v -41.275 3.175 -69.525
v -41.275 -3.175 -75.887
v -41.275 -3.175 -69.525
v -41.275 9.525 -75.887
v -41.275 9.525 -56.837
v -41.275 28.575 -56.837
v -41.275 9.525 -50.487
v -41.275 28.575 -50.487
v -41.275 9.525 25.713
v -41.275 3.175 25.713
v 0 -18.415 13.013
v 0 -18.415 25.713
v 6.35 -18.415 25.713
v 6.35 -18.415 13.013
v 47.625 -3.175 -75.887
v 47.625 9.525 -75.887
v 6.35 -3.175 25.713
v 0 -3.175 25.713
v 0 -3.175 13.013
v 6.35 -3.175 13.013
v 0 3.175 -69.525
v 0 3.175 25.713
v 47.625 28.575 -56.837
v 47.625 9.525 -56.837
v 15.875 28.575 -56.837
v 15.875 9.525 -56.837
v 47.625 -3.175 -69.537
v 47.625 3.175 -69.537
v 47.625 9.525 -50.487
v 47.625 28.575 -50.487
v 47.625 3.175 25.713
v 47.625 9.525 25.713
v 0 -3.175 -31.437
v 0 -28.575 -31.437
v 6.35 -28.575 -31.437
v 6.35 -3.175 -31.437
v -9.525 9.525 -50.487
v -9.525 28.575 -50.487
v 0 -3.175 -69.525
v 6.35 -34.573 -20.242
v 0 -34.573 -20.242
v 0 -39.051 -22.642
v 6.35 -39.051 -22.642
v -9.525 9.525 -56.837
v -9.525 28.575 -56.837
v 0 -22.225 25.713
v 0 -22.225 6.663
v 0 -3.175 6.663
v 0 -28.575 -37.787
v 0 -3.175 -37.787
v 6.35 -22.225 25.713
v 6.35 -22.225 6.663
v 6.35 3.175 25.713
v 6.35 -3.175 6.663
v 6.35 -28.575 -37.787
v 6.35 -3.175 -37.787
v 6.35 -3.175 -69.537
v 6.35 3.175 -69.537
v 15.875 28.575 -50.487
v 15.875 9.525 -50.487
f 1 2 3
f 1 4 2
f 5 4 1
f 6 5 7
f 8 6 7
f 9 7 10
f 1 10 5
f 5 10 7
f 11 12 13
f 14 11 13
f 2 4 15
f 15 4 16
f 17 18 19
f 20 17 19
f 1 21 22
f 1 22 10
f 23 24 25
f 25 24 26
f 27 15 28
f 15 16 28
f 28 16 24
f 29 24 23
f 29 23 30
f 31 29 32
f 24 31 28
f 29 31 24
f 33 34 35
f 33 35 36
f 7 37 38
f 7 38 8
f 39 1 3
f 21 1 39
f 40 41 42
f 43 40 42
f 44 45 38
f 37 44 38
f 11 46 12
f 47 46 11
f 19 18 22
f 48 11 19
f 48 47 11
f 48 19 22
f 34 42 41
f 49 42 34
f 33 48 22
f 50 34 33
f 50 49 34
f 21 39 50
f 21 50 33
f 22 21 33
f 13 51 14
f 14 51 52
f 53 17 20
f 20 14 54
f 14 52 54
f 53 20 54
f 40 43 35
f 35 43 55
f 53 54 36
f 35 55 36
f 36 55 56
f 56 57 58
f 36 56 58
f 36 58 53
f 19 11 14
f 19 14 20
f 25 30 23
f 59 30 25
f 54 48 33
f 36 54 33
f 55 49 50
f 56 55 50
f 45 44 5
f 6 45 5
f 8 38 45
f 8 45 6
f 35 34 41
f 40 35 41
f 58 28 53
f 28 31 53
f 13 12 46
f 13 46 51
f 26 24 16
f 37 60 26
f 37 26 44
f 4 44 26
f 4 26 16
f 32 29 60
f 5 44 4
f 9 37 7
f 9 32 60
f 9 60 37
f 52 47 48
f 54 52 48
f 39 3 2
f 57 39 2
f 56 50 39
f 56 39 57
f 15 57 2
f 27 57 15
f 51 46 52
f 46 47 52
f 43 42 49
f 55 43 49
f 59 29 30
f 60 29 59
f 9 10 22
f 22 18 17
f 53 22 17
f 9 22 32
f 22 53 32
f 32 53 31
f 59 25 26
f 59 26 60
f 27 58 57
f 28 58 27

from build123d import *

# Parameters (mm, degrees)
F0_W      = 25.4
F0_H      = 6.35
F0_W_2    = 19.05
F1_DEPTH  = 6.35
F3_DEPTH  = 6.35
F4_W      = 31.75
F4_H      = 6.35
F5_DEPTH  = 19.05
F6_W      = 41.275
F6_H      = 6.35
F7_DEPTH  = 6.35
F8_W      = 41.275
F8_H      = 6.361497178
F9_DEPTH  = 6.35
F10_W     = 6.35
F10_H     = 3.81
F11_DEPTH = 12.7


with BuildPart() as f1:
    # F0 (on Right) → F1 (new body)
    with BuildSketch(Plane.YZ):
        Polygon((-28.575, -37.7865453147), (-28.575, -31.4365453147), (-34.5734524408, -20.2424143384), (-39.0511048314, -22.6417953147), align=None)
        with Locations((-15.875, -34.6115453147)):
            Rectangle(F0_W, F0_H)
        Polygon((3.175, 25.7134546853), (-3.175, 25.7134546853), (-3.175, 13.0134546853), (-3.175, 6.6634546853), (-3.175, -31.4365453147), (-3.175, -37.7865453147), (-3.175, -75.8865453147), (3.175, -75.8865453147), align=None)
        with Locations((-12.7, 9.8384546853)):
            Rectangle(F0_W_2, F0_H)
    extrude(amount=F1_DEPTH)

    # F2 (on face) → F3 (join)
    with BuildSketch(Plane(origin=(0, 3.175, 0), x_dir=(-1, 0, 0), z_dir=(0, 1, 0))):
        Polygon((41.275, 25.7134546853), (-3.175, 25.7134546853), (-47.625, 25.7134546853), (-47.625, -75.8865453147), (-6.35, -75.8865453147), (0, -75.8865453147), (41.275, -75.8865453147), align=None)
    extrude(amount=F3_DEPTH)

    # F4 (on face) → F5 (join)
    with BuildSketch(Plane(origin=(0, 9.525, 0), x_dir=(-1, 0, 0), z_dir=(0, 1, 0))):
        with Locations((-31.75, -53.6615453147)):
            Rectangle(F4_W, F4_H)
        with Locations((25.4, -53.6615453147)):
            Rectangle(F4_W, F4_H)
    extrude(amount=F5_DEPTH)

    # F6 (on face) → F7 (join)
    with BuildSketch(Plane.XZ.offset(-3.175)):
        with Locations((26.9875, -72.7115453147)):
            Rectangle(F6_W, F6_H)
    extrude(amount=F7_DEPTH)

    # F8 (on face) → F9 (join)
    with BuildSketch(Plane.XZ.offset(-3.175)):
        with Locations((-20.6375, -72.7057967257)):
            Rectangle(F8_W, F8_H)
    extrude(amount=F9_DEPTH)

    # F10 (on face) → F11 (join)
    with BuildSketch(Plane.XY.offset(13.0134546853)):
        with Locations((3.175, -20.32)):
            Rectangle(F10_W, F10_H)
    extrude(amount=F11_DEPTH)


solid = f1.part
